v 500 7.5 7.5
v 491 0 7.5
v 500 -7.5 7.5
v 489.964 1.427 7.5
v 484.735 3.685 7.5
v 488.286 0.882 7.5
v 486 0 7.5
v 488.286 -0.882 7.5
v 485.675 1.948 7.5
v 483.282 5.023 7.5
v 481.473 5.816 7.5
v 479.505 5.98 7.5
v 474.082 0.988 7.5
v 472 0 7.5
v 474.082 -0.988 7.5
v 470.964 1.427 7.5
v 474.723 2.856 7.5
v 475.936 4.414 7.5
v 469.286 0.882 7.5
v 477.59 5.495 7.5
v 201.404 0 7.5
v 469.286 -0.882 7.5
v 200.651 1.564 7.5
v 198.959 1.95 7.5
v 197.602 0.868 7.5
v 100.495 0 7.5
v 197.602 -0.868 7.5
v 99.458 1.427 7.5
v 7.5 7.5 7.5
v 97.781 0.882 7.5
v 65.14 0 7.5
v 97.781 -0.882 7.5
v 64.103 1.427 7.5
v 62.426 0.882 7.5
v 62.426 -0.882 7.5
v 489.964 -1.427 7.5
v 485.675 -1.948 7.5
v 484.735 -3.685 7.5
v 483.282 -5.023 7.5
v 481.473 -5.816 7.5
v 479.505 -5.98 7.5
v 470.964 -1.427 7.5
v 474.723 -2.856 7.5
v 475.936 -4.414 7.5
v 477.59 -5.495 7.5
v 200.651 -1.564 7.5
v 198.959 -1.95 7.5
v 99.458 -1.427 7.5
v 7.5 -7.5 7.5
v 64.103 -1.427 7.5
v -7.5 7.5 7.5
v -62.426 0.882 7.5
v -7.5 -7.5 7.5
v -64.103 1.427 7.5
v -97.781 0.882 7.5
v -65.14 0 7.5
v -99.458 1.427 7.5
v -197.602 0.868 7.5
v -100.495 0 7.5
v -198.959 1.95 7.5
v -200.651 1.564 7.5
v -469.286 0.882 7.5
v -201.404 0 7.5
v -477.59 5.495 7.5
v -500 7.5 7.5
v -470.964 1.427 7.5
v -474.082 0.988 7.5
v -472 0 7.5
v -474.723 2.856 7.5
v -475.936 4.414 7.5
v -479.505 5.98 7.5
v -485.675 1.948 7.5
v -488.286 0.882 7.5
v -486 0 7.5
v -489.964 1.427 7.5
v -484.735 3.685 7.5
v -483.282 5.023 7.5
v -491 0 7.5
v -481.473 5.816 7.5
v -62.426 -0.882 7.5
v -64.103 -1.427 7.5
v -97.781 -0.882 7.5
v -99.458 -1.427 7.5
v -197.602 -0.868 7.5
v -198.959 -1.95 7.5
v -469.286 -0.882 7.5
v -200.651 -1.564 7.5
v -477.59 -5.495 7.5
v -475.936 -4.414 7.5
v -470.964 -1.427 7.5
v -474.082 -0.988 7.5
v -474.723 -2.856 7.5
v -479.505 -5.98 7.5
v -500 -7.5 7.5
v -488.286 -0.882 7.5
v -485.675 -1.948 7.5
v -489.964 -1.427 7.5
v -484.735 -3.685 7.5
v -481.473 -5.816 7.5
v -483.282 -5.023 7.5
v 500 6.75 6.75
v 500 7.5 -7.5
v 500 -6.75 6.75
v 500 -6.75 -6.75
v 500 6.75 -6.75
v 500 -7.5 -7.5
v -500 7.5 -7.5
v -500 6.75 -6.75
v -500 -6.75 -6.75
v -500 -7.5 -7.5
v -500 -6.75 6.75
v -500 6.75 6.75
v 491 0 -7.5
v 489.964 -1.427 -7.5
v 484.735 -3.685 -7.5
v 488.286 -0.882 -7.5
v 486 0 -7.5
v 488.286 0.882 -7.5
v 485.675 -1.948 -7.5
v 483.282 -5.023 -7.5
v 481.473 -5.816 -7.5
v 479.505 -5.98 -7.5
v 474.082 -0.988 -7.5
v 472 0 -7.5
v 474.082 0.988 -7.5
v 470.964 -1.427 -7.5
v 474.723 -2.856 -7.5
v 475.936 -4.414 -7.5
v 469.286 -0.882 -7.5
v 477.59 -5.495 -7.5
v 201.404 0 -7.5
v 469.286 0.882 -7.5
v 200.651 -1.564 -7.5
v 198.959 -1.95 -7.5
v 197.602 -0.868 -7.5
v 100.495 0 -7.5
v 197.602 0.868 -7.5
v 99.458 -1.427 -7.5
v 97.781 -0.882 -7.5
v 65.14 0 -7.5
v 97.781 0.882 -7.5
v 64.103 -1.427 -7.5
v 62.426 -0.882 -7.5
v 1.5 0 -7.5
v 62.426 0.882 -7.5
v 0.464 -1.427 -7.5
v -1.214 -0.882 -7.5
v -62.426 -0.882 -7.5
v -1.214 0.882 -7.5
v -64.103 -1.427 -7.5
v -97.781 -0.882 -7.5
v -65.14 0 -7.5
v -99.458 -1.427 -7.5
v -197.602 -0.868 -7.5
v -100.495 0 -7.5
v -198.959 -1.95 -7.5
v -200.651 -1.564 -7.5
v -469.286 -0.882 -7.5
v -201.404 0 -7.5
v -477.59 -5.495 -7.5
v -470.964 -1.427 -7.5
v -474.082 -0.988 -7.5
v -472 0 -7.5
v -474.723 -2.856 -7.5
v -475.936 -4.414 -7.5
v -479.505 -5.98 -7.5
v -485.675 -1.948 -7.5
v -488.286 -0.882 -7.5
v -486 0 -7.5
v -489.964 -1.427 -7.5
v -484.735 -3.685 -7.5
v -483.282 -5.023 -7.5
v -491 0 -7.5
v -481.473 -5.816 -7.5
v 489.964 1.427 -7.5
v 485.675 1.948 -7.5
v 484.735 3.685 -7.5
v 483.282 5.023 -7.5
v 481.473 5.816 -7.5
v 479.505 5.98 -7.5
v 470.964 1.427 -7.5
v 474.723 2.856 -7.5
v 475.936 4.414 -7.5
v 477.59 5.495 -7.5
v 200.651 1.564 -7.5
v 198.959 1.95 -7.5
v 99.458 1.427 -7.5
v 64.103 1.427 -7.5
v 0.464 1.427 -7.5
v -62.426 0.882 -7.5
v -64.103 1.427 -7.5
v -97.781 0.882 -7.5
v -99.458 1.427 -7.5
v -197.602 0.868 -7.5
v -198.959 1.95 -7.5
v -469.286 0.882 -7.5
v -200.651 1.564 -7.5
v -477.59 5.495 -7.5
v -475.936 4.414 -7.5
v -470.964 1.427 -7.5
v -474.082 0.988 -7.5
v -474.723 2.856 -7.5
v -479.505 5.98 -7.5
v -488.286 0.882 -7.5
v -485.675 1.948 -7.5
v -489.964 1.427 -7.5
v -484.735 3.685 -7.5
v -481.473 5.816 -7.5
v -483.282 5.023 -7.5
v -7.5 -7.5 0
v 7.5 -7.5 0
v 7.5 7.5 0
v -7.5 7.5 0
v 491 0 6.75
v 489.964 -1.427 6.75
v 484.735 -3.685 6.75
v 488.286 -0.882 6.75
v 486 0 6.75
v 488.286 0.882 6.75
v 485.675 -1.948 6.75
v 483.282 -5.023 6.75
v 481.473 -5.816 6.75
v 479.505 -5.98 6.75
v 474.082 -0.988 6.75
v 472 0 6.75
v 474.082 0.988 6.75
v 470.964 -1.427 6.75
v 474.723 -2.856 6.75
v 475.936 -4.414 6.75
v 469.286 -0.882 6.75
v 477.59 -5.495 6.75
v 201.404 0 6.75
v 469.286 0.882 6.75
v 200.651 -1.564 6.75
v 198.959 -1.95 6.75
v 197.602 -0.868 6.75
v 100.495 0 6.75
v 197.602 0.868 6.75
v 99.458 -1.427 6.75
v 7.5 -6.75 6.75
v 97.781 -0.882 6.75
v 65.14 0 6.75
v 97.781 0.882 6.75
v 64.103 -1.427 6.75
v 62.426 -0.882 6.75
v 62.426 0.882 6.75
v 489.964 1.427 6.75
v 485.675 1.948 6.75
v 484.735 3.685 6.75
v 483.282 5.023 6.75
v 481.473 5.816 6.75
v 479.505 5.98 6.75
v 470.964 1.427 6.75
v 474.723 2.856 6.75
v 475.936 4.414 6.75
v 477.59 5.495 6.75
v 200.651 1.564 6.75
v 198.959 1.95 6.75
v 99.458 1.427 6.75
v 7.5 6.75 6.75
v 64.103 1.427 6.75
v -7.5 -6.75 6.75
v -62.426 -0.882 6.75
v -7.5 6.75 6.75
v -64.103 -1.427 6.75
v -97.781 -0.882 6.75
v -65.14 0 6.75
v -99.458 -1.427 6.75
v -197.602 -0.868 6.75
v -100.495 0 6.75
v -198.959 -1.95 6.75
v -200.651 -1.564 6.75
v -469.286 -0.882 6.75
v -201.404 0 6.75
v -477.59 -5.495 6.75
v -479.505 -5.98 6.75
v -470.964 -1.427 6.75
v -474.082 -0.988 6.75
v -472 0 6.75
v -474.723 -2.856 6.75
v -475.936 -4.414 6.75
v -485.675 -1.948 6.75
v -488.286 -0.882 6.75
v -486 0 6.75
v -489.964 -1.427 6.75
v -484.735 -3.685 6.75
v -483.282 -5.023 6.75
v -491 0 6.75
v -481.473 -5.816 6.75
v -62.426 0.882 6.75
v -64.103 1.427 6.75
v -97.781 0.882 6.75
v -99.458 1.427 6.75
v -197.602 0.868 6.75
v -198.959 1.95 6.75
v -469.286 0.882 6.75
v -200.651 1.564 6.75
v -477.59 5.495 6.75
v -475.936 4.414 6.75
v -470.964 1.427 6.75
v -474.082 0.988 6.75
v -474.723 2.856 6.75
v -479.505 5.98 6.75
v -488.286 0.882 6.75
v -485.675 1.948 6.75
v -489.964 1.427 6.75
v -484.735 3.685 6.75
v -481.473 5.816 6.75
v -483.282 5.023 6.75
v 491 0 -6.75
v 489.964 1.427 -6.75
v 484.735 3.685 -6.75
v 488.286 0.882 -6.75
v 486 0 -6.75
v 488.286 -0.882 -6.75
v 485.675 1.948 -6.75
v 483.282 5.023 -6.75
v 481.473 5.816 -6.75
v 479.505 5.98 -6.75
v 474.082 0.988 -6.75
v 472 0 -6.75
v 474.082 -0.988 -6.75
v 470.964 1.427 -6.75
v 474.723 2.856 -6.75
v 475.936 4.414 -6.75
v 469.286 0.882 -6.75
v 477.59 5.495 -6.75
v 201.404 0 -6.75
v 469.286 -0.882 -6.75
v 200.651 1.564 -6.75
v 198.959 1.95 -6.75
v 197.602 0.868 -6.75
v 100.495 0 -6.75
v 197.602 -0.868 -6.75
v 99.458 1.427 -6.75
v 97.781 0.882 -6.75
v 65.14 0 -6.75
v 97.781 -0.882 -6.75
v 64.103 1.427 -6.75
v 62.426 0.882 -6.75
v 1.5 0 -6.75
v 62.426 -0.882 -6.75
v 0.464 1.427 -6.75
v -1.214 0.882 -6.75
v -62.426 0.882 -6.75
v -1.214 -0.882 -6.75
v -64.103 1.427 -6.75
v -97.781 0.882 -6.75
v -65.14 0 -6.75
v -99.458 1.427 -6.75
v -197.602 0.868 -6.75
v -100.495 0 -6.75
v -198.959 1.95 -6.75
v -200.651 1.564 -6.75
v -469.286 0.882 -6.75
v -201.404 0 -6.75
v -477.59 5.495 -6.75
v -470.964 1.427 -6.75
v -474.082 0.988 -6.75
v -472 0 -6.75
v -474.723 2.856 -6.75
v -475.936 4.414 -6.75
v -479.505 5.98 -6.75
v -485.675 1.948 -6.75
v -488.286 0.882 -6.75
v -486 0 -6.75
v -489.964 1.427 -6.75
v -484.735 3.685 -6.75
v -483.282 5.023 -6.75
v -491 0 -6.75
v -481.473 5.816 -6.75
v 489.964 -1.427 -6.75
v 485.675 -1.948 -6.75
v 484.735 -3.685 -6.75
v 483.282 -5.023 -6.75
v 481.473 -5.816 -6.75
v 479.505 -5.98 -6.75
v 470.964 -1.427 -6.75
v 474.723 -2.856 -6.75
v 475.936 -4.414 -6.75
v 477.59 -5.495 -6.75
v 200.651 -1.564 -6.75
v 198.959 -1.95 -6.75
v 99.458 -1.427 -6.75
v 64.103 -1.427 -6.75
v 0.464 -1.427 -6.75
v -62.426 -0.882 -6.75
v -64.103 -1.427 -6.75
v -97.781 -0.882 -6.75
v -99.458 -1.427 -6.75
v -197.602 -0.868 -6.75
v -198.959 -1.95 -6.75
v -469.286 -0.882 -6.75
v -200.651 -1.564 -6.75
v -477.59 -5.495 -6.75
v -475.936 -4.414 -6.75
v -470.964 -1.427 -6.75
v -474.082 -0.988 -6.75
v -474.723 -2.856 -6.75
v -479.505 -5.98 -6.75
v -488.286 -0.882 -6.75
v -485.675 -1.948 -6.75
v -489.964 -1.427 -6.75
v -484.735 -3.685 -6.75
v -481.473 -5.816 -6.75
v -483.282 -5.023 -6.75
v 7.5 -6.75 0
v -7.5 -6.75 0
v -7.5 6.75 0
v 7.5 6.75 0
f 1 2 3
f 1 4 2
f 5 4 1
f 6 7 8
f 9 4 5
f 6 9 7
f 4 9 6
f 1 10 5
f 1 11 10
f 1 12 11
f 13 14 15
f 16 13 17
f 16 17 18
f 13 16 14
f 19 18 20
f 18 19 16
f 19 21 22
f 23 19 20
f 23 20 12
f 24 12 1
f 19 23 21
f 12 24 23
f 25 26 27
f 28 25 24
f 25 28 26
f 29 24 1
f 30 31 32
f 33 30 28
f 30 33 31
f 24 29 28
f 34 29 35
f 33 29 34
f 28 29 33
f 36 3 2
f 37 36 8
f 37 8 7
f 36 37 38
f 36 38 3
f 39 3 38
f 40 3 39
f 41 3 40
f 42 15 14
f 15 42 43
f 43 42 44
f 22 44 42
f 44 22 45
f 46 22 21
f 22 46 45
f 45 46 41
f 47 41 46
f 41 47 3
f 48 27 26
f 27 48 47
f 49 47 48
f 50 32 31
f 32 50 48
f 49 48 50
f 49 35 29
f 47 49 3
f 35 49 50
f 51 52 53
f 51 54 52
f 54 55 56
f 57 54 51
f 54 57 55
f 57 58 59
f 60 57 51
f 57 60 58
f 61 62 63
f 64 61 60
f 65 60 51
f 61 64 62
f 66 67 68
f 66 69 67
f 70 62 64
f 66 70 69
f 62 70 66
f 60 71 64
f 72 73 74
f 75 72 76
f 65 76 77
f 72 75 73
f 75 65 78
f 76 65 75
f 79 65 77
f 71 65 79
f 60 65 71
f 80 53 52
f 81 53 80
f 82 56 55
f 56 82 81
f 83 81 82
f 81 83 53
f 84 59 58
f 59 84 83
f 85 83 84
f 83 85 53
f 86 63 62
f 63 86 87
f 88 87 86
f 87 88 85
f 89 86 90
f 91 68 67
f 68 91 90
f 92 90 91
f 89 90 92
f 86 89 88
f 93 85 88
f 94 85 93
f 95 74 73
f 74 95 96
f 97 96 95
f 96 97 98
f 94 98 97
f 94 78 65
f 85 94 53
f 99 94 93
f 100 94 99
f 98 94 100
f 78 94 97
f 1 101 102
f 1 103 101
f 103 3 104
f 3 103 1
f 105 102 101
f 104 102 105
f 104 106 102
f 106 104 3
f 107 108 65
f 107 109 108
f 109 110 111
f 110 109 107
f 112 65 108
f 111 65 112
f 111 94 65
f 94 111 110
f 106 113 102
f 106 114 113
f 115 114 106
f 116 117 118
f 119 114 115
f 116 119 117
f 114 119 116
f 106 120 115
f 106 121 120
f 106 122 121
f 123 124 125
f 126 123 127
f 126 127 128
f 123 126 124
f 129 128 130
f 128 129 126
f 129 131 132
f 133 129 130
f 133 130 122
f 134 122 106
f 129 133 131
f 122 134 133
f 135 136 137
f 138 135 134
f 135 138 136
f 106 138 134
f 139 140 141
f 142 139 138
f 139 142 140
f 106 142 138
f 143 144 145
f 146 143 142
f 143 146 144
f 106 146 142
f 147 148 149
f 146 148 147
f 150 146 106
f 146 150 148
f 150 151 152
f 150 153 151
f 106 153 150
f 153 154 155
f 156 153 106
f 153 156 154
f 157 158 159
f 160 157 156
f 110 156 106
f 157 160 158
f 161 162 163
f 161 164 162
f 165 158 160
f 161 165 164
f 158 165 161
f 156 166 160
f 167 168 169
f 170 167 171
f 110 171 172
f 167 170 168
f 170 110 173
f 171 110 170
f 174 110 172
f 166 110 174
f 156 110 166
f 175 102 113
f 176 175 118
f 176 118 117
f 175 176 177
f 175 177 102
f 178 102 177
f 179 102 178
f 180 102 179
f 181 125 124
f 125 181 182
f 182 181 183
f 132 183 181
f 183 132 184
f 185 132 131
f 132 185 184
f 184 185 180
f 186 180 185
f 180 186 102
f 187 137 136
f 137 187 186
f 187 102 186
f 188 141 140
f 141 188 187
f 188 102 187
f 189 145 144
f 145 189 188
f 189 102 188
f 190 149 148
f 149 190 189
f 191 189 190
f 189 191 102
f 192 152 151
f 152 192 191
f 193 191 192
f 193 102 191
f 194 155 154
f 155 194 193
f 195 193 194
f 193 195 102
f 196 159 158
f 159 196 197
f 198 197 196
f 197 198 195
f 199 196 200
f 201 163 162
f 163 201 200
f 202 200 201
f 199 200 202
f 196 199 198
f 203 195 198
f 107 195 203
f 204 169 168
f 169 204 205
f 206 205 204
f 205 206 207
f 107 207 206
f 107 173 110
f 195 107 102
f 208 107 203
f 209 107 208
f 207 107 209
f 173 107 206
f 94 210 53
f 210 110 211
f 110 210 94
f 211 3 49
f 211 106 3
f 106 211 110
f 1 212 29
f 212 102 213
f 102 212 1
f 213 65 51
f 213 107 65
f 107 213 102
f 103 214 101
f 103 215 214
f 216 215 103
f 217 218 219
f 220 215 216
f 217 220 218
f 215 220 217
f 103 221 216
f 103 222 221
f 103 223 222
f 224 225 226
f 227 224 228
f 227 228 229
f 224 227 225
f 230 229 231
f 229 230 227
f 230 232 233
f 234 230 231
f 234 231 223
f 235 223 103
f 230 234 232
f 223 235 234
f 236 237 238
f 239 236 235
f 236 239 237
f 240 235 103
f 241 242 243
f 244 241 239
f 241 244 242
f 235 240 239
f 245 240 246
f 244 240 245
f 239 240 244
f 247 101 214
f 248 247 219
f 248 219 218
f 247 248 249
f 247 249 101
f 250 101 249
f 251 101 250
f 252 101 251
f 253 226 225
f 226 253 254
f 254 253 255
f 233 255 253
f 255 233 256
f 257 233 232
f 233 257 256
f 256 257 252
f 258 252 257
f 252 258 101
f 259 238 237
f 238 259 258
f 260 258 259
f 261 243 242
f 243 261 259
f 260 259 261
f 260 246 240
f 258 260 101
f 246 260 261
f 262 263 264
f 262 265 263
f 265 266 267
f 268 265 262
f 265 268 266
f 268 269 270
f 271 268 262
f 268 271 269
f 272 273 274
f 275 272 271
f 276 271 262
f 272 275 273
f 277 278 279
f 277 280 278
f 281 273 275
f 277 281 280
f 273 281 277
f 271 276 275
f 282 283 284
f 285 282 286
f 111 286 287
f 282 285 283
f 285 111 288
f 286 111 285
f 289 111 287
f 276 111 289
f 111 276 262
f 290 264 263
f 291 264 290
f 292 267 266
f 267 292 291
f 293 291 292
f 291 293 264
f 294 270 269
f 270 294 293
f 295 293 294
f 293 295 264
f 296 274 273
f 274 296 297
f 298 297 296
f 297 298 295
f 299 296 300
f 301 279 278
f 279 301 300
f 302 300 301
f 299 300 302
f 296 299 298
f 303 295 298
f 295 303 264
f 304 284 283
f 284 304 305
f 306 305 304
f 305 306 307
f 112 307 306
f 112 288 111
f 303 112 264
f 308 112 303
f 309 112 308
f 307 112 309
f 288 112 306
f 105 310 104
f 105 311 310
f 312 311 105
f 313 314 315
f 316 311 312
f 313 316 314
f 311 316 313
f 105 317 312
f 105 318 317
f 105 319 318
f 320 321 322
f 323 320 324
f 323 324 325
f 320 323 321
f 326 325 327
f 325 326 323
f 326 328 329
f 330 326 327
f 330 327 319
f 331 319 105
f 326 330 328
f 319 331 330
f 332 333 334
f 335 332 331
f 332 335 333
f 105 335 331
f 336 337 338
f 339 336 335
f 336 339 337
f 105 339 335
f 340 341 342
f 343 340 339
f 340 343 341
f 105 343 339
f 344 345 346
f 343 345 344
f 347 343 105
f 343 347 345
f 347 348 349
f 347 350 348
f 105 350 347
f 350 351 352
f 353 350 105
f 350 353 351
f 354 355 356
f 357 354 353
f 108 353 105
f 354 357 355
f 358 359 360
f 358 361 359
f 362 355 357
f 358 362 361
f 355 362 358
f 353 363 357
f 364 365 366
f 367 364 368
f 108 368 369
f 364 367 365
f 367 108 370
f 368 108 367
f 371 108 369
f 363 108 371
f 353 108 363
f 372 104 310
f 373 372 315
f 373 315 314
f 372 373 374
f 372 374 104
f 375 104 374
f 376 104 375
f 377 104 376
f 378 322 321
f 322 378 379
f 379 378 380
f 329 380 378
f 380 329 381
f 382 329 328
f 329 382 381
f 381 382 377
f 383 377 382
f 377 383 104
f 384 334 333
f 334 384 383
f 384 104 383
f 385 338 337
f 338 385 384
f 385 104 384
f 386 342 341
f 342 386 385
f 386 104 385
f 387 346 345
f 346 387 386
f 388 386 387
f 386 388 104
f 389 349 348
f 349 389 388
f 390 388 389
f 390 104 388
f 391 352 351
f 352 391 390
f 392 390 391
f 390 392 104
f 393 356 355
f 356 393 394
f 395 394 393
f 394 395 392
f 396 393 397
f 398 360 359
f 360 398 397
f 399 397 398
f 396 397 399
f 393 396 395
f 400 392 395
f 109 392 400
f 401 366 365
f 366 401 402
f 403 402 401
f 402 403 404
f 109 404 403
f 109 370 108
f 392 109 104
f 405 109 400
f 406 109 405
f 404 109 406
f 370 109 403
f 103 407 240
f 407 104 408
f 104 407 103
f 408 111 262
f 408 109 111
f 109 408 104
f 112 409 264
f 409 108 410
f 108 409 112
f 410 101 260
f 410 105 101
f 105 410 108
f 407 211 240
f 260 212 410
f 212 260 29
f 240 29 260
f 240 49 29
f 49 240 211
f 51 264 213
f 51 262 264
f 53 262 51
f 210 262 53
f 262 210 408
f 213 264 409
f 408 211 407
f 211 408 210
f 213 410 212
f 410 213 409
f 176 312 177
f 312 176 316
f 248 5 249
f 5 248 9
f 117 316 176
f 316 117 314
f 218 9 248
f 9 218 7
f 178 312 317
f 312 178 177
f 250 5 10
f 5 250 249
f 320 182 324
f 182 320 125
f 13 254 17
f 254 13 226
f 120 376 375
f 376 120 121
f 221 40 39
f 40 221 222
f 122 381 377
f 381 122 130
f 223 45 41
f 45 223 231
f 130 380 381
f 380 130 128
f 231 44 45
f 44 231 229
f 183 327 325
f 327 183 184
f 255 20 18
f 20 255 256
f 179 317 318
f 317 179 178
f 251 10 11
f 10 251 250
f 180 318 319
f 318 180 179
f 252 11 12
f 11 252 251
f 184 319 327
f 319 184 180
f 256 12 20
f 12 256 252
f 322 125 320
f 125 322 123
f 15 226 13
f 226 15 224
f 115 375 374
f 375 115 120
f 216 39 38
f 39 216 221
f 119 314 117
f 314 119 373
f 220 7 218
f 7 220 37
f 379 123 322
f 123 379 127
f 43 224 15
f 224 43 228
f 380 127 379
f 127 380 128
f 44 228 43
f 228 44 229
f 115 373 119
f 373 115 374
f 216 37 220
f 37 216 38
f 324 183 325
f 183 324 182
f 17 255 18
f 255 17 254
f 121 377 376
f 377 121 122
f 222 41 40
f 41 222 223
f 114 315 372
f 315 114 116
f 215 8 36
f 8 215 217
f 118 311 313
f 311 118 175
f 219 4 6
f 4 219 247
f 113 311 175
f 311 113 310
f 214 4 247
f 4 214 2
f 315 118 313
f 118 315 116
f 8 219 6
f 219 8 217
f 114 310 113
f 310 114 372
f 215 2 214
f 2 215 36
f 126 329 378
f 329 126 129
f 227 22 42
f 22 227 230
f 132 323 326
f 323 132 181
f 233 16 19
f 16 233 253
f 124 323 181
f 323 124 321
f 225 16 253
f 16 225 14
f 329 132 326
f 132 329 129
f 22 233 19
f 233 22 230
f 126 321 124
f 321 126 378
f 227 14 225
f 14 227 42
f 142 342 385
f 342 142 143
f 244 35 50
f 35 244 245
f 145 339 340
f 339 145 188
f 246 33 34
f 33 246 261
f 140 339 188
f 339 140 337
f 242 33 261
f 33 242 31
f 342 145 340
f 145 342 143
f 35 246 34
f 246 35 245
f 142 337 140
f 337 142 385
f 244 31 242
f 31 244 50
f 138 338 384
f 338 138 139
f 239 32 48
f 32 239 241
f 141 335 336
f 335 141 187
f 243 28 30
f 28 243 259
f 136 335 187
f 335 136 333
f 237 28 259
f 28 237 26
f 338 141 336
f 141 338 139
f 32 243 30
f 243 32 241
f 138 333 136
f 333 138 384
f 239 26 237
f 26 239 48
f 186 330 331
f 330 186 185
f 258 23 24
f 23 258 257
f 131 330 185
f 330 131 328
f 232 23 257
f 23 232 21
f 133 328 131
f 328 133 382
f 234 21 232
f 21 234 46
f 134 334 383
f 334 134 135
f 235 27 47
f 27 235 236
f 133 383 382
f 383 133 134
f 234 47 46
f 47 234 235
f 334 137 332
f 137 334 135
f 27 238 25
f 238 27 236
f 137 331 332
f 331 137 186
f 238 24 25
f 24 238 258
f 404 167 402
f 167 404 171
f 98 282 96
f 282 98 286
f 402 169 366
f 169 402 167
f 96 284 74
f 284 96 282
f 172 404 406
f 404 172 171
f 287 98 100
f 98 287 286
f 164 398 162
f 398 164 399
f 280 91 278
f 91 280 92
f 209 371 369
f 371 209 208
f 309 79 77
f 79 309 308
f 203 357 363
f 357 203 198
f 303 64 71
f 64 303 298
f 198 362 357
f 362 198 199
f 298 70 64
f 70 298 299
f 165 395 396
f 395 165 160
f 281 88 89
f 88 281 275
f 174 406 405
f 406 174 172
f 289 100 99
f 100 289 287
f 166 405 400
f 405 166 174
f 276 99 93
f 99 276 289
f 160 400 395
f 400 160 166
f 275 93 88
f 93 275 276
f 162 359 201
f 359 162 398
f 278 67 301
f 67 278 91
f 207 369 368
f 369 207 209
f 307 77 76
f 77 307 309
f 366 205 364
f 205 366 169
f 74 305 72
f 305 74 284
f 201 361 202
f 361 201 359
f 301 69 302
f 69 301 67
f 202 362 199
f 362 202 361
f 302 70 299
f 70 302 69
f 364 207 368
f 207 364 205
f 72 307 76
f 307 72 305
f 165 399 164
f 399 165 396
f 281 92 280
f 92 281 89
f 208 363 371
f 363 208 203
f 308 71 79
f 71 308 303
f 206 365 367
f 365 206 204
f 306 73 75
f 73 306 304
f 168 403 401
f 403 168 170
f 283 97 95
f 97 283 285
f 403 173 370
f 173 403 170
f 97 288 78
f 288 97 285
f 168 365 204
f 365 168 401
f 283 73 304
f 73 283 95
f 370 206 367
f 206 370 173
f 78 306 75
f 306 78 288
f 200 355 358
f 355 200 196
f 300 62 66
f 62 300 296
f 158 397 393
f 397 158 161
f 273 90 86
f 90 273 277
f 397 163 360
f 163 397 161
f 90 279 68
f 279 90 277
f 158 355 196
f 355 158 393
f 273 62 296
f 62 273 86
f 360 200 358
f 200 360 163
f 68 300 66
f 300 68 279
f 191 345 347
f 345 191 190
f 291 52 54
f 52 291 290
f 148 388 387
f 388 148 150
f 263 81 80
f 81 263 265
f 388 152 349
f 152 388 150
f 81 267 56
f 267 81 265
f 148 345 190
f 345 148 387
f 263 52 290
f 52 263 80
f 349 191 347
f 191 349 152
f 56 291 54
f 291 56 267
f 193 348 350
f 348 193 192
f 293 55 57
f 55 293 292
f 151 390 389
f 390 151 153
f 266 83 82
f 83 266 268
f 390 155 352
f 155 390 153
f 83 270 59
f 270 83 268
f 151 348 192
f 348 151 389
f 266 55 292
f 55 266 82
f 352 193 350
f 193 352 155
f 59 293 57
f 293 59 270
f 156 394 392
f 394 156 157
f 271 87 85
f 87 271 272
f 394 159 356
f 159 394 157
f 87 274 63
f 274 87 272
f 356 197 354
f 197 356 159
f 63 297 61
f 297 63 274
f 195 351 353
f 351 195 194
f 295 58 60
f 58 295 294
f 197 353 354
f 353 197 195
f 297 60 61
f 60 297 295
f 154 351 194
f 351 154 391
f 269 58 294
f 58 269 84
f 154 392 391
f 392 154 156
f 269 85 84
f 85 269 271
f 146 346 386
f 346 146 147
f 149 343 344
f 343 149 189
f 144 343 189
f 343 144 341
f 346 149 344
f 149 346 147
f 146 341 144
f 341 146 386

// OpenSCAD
// file: ../conf.scad
//rendering
epsilon=0.1;

//model
frame_length=1000;
frame_inner=13.5;
frame_outer=15;

support_width=100;
support_height=0.75;
support_inner=90;
support_diameter=3;

rack_width=150;
rack_inner=140;
rack_diameter=3;
rack_height=250;
rack_plate_height=4;

stand_height=250;
stand_width=282;
stand_diameter=6;
stand_head_height=35;
stand_head_diameter=4;

foot_outer=12;
foot_inner=8;
foot_length=500;

motor_hole_distance=480;
motor_hole_diameter=12;
motor_mount_distance=19;
motor_mount_diameter=3;
// main file
include <../conf.scad>

module crossbar() {

module bar(length,outer,inner) {
	difference() {
		cube([outer, outer, length], true);
		cube([inner, inner, length+epsilon], true);
		translate([outer/2,0,0])
		cube([outer, outer+epsilon, outer], true);
	}
}

plate_distance=support_inner*sqrt(2)/2;
rack_distance=rack_inner*sqrt(2)/2;
stand_distance=stand_width*sqrt(2)/2;

difference() {

	//bar
	rotate([90,-90,90])
	color("silver")
	bar(frame_length, frame_outer, frame_inner);

	//center hole
	cylinder(frame_outer+epsilon,d=support_diameter,center=true);

	for(i=[0:1]) {
		rotate(i*180){
			
			//plate screw hole
			translate([plate_distance,0,0])
			cylinder(frame_outer+epsilon,d=support_diameter,center=true);

			//rack hole
			translate([rack_distance,0,0])
			cylinder(frame_outer+epsilon,d=rack_diameter,center=true);

			//stand hole
			translate([stand_distance,0,0])
			cylinder(frame_outer+epsilon,d=stand_head_diameter,center=true);

			//motor holes
			translate([motor_hole_distance,0,0]){
				cylinder(frame_outer+epsilon,d=motor_hole_diameter,center=true);
				translate([motor_mount_distance/2,0,0])
				cylinder(frame_outer+epsilon,d=motor_mount_diameter,center=true);
				translate([-motor_mount_distance/2,0,0])
				cylinder(frame_outer+epsilon,d=motor_mount_diameter,center=true);
			}

		}
	}
}
}

crossbar();
